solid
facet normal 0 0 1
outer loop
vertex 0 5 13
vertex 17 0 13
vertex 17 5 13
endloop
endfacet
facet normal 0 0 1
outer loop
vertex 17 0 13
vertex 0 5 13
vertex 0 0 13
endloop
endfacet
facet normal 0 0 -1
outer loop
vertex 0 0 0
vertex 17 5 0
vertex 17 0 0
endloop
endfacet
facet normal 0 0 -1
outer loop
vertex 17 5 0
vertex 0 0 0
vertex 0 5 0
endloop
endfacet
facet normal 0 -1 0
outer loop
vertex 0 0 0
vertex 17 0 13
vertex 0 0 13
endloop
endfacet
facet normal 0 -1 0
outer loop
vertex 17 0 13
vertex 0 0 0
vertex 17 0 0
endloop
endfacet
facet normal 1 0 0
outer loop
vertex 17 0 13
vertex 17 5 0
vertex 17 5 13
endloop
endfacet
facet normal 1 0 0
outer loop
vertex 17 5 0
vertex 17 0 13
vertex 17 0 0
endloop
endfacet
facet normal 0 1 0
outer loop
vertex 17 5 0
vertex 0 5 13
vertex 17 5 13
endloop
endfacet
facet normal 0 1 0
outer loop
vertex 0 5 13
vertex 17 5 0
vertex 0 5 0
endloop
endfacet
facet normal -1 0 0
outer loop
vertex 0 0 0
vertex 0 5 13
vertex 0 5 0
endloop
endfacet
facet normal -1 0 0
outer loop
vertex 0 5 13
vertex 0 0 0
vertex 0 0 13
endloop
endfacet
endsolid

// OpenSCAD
// Generated by SolidPython 1.0.1 on 2020-07-29 00:46:56


cube(size = [17, 5, 13]);
/***********************************************
*********      SolidPython code:      **********
************************************************
 
# import packages: SolidPython
from solid import *
from solid.utils import *
from itertools import chain, combinations, permutations


class Resize:

    def __init__(self, scad_file):
        self.scad_file = scad_file
        #self.scad_file = import_scad(scad_file)
        # cone/cylinder param:
        self.r1 = 0
        self.r2 = 0
        self.h = 0
        # rectangular prism param:
        self.w = 0
        self.l = 0
        # ellipse param:
        self.r = 0

    # import OpenScad code (file name corresponds to shape)


    # classify shape + parameters
    def assign(self, param1, param2, param3):
        if self.scad_file == 'cone.scad':
            self.r1 = param1
            self.r2 = param2
            self.h = param3
        elif self.scad_file == 'cylinder.scad':
            self.r1 = param1
            self.r2 = param2
            self.h = param3
        elif self.scad_file == 'rectangularPrism.scad':
            self.h = param1
            self.l = param2
            self.w = param3
        else:
            self.r = param1
            self.h = param2

    # resize parameters
    def iterate(self):
        x = range(3, 20, 2)
        i = 1
        if self.scad_file == 'cone.scad':
            tempList = list(permutations(x, 2))
            for temp in tempList:
                param1 = temp[0]
                param2 = temp[1]
                filepath = 'produced_scad_files/' + 'cone' + str(param1) + '_' + str(param2) + '_' + '.scad'
                scad_render_to_file(cylinder(h=param1, r1=param2, r2=0), filepath)

        elif self.scad_file == 'cylinder.scad':
            tempList = list(permutations(x, 3))
            for temp in tempList:
                param1 = temp[0]
                param2 = temp[1]
                filepath = 'produced_scad_files/' + 'cylinder' + str(param1) + '_' + str(param2) + '_' + '.scad'
                scad_render_to_file(cylinder(h=param1, r1=param2, r2=param2), filepath)

        elif self.scad_file == 'rectangularPrism.scad':
            tempList = list(permutations(x, 3))
            for temp in tempList:
                param1 = temp[0]
                param2 = temp[1]
                param3 = temp[2]
                filepath = 'produced_scad_files/' + 'rectangularPrism' + str(param1) + '_' + str(param2) + '_' + str(
                    param3) + '.scad'
                scad_render_to_file(cube(size=(param1, param2, param3)), filepath)

        elif self.scad_file == 'ellipse.scad':
            tempList = list(permutations(x, 4))
            for temp in tempList:
                param1 = temp[0]
                param2 = temp[1]
                param3 = temp[2]
                param4 = temp[3]
                filepath = 'produced_scad_files/' + 'ellipse' + str(param1) + '_' + str(param2) + '_' + str(param3) + '_' + str(param4) + '.scad'
                scad_render_to_file(scale([param1, param2, param3])(sphere(r=param4)), filepath)

    def render_to_scadfile(self):
        scad_render_to_file(scad, 'example.scad') 
 
************************************************/
